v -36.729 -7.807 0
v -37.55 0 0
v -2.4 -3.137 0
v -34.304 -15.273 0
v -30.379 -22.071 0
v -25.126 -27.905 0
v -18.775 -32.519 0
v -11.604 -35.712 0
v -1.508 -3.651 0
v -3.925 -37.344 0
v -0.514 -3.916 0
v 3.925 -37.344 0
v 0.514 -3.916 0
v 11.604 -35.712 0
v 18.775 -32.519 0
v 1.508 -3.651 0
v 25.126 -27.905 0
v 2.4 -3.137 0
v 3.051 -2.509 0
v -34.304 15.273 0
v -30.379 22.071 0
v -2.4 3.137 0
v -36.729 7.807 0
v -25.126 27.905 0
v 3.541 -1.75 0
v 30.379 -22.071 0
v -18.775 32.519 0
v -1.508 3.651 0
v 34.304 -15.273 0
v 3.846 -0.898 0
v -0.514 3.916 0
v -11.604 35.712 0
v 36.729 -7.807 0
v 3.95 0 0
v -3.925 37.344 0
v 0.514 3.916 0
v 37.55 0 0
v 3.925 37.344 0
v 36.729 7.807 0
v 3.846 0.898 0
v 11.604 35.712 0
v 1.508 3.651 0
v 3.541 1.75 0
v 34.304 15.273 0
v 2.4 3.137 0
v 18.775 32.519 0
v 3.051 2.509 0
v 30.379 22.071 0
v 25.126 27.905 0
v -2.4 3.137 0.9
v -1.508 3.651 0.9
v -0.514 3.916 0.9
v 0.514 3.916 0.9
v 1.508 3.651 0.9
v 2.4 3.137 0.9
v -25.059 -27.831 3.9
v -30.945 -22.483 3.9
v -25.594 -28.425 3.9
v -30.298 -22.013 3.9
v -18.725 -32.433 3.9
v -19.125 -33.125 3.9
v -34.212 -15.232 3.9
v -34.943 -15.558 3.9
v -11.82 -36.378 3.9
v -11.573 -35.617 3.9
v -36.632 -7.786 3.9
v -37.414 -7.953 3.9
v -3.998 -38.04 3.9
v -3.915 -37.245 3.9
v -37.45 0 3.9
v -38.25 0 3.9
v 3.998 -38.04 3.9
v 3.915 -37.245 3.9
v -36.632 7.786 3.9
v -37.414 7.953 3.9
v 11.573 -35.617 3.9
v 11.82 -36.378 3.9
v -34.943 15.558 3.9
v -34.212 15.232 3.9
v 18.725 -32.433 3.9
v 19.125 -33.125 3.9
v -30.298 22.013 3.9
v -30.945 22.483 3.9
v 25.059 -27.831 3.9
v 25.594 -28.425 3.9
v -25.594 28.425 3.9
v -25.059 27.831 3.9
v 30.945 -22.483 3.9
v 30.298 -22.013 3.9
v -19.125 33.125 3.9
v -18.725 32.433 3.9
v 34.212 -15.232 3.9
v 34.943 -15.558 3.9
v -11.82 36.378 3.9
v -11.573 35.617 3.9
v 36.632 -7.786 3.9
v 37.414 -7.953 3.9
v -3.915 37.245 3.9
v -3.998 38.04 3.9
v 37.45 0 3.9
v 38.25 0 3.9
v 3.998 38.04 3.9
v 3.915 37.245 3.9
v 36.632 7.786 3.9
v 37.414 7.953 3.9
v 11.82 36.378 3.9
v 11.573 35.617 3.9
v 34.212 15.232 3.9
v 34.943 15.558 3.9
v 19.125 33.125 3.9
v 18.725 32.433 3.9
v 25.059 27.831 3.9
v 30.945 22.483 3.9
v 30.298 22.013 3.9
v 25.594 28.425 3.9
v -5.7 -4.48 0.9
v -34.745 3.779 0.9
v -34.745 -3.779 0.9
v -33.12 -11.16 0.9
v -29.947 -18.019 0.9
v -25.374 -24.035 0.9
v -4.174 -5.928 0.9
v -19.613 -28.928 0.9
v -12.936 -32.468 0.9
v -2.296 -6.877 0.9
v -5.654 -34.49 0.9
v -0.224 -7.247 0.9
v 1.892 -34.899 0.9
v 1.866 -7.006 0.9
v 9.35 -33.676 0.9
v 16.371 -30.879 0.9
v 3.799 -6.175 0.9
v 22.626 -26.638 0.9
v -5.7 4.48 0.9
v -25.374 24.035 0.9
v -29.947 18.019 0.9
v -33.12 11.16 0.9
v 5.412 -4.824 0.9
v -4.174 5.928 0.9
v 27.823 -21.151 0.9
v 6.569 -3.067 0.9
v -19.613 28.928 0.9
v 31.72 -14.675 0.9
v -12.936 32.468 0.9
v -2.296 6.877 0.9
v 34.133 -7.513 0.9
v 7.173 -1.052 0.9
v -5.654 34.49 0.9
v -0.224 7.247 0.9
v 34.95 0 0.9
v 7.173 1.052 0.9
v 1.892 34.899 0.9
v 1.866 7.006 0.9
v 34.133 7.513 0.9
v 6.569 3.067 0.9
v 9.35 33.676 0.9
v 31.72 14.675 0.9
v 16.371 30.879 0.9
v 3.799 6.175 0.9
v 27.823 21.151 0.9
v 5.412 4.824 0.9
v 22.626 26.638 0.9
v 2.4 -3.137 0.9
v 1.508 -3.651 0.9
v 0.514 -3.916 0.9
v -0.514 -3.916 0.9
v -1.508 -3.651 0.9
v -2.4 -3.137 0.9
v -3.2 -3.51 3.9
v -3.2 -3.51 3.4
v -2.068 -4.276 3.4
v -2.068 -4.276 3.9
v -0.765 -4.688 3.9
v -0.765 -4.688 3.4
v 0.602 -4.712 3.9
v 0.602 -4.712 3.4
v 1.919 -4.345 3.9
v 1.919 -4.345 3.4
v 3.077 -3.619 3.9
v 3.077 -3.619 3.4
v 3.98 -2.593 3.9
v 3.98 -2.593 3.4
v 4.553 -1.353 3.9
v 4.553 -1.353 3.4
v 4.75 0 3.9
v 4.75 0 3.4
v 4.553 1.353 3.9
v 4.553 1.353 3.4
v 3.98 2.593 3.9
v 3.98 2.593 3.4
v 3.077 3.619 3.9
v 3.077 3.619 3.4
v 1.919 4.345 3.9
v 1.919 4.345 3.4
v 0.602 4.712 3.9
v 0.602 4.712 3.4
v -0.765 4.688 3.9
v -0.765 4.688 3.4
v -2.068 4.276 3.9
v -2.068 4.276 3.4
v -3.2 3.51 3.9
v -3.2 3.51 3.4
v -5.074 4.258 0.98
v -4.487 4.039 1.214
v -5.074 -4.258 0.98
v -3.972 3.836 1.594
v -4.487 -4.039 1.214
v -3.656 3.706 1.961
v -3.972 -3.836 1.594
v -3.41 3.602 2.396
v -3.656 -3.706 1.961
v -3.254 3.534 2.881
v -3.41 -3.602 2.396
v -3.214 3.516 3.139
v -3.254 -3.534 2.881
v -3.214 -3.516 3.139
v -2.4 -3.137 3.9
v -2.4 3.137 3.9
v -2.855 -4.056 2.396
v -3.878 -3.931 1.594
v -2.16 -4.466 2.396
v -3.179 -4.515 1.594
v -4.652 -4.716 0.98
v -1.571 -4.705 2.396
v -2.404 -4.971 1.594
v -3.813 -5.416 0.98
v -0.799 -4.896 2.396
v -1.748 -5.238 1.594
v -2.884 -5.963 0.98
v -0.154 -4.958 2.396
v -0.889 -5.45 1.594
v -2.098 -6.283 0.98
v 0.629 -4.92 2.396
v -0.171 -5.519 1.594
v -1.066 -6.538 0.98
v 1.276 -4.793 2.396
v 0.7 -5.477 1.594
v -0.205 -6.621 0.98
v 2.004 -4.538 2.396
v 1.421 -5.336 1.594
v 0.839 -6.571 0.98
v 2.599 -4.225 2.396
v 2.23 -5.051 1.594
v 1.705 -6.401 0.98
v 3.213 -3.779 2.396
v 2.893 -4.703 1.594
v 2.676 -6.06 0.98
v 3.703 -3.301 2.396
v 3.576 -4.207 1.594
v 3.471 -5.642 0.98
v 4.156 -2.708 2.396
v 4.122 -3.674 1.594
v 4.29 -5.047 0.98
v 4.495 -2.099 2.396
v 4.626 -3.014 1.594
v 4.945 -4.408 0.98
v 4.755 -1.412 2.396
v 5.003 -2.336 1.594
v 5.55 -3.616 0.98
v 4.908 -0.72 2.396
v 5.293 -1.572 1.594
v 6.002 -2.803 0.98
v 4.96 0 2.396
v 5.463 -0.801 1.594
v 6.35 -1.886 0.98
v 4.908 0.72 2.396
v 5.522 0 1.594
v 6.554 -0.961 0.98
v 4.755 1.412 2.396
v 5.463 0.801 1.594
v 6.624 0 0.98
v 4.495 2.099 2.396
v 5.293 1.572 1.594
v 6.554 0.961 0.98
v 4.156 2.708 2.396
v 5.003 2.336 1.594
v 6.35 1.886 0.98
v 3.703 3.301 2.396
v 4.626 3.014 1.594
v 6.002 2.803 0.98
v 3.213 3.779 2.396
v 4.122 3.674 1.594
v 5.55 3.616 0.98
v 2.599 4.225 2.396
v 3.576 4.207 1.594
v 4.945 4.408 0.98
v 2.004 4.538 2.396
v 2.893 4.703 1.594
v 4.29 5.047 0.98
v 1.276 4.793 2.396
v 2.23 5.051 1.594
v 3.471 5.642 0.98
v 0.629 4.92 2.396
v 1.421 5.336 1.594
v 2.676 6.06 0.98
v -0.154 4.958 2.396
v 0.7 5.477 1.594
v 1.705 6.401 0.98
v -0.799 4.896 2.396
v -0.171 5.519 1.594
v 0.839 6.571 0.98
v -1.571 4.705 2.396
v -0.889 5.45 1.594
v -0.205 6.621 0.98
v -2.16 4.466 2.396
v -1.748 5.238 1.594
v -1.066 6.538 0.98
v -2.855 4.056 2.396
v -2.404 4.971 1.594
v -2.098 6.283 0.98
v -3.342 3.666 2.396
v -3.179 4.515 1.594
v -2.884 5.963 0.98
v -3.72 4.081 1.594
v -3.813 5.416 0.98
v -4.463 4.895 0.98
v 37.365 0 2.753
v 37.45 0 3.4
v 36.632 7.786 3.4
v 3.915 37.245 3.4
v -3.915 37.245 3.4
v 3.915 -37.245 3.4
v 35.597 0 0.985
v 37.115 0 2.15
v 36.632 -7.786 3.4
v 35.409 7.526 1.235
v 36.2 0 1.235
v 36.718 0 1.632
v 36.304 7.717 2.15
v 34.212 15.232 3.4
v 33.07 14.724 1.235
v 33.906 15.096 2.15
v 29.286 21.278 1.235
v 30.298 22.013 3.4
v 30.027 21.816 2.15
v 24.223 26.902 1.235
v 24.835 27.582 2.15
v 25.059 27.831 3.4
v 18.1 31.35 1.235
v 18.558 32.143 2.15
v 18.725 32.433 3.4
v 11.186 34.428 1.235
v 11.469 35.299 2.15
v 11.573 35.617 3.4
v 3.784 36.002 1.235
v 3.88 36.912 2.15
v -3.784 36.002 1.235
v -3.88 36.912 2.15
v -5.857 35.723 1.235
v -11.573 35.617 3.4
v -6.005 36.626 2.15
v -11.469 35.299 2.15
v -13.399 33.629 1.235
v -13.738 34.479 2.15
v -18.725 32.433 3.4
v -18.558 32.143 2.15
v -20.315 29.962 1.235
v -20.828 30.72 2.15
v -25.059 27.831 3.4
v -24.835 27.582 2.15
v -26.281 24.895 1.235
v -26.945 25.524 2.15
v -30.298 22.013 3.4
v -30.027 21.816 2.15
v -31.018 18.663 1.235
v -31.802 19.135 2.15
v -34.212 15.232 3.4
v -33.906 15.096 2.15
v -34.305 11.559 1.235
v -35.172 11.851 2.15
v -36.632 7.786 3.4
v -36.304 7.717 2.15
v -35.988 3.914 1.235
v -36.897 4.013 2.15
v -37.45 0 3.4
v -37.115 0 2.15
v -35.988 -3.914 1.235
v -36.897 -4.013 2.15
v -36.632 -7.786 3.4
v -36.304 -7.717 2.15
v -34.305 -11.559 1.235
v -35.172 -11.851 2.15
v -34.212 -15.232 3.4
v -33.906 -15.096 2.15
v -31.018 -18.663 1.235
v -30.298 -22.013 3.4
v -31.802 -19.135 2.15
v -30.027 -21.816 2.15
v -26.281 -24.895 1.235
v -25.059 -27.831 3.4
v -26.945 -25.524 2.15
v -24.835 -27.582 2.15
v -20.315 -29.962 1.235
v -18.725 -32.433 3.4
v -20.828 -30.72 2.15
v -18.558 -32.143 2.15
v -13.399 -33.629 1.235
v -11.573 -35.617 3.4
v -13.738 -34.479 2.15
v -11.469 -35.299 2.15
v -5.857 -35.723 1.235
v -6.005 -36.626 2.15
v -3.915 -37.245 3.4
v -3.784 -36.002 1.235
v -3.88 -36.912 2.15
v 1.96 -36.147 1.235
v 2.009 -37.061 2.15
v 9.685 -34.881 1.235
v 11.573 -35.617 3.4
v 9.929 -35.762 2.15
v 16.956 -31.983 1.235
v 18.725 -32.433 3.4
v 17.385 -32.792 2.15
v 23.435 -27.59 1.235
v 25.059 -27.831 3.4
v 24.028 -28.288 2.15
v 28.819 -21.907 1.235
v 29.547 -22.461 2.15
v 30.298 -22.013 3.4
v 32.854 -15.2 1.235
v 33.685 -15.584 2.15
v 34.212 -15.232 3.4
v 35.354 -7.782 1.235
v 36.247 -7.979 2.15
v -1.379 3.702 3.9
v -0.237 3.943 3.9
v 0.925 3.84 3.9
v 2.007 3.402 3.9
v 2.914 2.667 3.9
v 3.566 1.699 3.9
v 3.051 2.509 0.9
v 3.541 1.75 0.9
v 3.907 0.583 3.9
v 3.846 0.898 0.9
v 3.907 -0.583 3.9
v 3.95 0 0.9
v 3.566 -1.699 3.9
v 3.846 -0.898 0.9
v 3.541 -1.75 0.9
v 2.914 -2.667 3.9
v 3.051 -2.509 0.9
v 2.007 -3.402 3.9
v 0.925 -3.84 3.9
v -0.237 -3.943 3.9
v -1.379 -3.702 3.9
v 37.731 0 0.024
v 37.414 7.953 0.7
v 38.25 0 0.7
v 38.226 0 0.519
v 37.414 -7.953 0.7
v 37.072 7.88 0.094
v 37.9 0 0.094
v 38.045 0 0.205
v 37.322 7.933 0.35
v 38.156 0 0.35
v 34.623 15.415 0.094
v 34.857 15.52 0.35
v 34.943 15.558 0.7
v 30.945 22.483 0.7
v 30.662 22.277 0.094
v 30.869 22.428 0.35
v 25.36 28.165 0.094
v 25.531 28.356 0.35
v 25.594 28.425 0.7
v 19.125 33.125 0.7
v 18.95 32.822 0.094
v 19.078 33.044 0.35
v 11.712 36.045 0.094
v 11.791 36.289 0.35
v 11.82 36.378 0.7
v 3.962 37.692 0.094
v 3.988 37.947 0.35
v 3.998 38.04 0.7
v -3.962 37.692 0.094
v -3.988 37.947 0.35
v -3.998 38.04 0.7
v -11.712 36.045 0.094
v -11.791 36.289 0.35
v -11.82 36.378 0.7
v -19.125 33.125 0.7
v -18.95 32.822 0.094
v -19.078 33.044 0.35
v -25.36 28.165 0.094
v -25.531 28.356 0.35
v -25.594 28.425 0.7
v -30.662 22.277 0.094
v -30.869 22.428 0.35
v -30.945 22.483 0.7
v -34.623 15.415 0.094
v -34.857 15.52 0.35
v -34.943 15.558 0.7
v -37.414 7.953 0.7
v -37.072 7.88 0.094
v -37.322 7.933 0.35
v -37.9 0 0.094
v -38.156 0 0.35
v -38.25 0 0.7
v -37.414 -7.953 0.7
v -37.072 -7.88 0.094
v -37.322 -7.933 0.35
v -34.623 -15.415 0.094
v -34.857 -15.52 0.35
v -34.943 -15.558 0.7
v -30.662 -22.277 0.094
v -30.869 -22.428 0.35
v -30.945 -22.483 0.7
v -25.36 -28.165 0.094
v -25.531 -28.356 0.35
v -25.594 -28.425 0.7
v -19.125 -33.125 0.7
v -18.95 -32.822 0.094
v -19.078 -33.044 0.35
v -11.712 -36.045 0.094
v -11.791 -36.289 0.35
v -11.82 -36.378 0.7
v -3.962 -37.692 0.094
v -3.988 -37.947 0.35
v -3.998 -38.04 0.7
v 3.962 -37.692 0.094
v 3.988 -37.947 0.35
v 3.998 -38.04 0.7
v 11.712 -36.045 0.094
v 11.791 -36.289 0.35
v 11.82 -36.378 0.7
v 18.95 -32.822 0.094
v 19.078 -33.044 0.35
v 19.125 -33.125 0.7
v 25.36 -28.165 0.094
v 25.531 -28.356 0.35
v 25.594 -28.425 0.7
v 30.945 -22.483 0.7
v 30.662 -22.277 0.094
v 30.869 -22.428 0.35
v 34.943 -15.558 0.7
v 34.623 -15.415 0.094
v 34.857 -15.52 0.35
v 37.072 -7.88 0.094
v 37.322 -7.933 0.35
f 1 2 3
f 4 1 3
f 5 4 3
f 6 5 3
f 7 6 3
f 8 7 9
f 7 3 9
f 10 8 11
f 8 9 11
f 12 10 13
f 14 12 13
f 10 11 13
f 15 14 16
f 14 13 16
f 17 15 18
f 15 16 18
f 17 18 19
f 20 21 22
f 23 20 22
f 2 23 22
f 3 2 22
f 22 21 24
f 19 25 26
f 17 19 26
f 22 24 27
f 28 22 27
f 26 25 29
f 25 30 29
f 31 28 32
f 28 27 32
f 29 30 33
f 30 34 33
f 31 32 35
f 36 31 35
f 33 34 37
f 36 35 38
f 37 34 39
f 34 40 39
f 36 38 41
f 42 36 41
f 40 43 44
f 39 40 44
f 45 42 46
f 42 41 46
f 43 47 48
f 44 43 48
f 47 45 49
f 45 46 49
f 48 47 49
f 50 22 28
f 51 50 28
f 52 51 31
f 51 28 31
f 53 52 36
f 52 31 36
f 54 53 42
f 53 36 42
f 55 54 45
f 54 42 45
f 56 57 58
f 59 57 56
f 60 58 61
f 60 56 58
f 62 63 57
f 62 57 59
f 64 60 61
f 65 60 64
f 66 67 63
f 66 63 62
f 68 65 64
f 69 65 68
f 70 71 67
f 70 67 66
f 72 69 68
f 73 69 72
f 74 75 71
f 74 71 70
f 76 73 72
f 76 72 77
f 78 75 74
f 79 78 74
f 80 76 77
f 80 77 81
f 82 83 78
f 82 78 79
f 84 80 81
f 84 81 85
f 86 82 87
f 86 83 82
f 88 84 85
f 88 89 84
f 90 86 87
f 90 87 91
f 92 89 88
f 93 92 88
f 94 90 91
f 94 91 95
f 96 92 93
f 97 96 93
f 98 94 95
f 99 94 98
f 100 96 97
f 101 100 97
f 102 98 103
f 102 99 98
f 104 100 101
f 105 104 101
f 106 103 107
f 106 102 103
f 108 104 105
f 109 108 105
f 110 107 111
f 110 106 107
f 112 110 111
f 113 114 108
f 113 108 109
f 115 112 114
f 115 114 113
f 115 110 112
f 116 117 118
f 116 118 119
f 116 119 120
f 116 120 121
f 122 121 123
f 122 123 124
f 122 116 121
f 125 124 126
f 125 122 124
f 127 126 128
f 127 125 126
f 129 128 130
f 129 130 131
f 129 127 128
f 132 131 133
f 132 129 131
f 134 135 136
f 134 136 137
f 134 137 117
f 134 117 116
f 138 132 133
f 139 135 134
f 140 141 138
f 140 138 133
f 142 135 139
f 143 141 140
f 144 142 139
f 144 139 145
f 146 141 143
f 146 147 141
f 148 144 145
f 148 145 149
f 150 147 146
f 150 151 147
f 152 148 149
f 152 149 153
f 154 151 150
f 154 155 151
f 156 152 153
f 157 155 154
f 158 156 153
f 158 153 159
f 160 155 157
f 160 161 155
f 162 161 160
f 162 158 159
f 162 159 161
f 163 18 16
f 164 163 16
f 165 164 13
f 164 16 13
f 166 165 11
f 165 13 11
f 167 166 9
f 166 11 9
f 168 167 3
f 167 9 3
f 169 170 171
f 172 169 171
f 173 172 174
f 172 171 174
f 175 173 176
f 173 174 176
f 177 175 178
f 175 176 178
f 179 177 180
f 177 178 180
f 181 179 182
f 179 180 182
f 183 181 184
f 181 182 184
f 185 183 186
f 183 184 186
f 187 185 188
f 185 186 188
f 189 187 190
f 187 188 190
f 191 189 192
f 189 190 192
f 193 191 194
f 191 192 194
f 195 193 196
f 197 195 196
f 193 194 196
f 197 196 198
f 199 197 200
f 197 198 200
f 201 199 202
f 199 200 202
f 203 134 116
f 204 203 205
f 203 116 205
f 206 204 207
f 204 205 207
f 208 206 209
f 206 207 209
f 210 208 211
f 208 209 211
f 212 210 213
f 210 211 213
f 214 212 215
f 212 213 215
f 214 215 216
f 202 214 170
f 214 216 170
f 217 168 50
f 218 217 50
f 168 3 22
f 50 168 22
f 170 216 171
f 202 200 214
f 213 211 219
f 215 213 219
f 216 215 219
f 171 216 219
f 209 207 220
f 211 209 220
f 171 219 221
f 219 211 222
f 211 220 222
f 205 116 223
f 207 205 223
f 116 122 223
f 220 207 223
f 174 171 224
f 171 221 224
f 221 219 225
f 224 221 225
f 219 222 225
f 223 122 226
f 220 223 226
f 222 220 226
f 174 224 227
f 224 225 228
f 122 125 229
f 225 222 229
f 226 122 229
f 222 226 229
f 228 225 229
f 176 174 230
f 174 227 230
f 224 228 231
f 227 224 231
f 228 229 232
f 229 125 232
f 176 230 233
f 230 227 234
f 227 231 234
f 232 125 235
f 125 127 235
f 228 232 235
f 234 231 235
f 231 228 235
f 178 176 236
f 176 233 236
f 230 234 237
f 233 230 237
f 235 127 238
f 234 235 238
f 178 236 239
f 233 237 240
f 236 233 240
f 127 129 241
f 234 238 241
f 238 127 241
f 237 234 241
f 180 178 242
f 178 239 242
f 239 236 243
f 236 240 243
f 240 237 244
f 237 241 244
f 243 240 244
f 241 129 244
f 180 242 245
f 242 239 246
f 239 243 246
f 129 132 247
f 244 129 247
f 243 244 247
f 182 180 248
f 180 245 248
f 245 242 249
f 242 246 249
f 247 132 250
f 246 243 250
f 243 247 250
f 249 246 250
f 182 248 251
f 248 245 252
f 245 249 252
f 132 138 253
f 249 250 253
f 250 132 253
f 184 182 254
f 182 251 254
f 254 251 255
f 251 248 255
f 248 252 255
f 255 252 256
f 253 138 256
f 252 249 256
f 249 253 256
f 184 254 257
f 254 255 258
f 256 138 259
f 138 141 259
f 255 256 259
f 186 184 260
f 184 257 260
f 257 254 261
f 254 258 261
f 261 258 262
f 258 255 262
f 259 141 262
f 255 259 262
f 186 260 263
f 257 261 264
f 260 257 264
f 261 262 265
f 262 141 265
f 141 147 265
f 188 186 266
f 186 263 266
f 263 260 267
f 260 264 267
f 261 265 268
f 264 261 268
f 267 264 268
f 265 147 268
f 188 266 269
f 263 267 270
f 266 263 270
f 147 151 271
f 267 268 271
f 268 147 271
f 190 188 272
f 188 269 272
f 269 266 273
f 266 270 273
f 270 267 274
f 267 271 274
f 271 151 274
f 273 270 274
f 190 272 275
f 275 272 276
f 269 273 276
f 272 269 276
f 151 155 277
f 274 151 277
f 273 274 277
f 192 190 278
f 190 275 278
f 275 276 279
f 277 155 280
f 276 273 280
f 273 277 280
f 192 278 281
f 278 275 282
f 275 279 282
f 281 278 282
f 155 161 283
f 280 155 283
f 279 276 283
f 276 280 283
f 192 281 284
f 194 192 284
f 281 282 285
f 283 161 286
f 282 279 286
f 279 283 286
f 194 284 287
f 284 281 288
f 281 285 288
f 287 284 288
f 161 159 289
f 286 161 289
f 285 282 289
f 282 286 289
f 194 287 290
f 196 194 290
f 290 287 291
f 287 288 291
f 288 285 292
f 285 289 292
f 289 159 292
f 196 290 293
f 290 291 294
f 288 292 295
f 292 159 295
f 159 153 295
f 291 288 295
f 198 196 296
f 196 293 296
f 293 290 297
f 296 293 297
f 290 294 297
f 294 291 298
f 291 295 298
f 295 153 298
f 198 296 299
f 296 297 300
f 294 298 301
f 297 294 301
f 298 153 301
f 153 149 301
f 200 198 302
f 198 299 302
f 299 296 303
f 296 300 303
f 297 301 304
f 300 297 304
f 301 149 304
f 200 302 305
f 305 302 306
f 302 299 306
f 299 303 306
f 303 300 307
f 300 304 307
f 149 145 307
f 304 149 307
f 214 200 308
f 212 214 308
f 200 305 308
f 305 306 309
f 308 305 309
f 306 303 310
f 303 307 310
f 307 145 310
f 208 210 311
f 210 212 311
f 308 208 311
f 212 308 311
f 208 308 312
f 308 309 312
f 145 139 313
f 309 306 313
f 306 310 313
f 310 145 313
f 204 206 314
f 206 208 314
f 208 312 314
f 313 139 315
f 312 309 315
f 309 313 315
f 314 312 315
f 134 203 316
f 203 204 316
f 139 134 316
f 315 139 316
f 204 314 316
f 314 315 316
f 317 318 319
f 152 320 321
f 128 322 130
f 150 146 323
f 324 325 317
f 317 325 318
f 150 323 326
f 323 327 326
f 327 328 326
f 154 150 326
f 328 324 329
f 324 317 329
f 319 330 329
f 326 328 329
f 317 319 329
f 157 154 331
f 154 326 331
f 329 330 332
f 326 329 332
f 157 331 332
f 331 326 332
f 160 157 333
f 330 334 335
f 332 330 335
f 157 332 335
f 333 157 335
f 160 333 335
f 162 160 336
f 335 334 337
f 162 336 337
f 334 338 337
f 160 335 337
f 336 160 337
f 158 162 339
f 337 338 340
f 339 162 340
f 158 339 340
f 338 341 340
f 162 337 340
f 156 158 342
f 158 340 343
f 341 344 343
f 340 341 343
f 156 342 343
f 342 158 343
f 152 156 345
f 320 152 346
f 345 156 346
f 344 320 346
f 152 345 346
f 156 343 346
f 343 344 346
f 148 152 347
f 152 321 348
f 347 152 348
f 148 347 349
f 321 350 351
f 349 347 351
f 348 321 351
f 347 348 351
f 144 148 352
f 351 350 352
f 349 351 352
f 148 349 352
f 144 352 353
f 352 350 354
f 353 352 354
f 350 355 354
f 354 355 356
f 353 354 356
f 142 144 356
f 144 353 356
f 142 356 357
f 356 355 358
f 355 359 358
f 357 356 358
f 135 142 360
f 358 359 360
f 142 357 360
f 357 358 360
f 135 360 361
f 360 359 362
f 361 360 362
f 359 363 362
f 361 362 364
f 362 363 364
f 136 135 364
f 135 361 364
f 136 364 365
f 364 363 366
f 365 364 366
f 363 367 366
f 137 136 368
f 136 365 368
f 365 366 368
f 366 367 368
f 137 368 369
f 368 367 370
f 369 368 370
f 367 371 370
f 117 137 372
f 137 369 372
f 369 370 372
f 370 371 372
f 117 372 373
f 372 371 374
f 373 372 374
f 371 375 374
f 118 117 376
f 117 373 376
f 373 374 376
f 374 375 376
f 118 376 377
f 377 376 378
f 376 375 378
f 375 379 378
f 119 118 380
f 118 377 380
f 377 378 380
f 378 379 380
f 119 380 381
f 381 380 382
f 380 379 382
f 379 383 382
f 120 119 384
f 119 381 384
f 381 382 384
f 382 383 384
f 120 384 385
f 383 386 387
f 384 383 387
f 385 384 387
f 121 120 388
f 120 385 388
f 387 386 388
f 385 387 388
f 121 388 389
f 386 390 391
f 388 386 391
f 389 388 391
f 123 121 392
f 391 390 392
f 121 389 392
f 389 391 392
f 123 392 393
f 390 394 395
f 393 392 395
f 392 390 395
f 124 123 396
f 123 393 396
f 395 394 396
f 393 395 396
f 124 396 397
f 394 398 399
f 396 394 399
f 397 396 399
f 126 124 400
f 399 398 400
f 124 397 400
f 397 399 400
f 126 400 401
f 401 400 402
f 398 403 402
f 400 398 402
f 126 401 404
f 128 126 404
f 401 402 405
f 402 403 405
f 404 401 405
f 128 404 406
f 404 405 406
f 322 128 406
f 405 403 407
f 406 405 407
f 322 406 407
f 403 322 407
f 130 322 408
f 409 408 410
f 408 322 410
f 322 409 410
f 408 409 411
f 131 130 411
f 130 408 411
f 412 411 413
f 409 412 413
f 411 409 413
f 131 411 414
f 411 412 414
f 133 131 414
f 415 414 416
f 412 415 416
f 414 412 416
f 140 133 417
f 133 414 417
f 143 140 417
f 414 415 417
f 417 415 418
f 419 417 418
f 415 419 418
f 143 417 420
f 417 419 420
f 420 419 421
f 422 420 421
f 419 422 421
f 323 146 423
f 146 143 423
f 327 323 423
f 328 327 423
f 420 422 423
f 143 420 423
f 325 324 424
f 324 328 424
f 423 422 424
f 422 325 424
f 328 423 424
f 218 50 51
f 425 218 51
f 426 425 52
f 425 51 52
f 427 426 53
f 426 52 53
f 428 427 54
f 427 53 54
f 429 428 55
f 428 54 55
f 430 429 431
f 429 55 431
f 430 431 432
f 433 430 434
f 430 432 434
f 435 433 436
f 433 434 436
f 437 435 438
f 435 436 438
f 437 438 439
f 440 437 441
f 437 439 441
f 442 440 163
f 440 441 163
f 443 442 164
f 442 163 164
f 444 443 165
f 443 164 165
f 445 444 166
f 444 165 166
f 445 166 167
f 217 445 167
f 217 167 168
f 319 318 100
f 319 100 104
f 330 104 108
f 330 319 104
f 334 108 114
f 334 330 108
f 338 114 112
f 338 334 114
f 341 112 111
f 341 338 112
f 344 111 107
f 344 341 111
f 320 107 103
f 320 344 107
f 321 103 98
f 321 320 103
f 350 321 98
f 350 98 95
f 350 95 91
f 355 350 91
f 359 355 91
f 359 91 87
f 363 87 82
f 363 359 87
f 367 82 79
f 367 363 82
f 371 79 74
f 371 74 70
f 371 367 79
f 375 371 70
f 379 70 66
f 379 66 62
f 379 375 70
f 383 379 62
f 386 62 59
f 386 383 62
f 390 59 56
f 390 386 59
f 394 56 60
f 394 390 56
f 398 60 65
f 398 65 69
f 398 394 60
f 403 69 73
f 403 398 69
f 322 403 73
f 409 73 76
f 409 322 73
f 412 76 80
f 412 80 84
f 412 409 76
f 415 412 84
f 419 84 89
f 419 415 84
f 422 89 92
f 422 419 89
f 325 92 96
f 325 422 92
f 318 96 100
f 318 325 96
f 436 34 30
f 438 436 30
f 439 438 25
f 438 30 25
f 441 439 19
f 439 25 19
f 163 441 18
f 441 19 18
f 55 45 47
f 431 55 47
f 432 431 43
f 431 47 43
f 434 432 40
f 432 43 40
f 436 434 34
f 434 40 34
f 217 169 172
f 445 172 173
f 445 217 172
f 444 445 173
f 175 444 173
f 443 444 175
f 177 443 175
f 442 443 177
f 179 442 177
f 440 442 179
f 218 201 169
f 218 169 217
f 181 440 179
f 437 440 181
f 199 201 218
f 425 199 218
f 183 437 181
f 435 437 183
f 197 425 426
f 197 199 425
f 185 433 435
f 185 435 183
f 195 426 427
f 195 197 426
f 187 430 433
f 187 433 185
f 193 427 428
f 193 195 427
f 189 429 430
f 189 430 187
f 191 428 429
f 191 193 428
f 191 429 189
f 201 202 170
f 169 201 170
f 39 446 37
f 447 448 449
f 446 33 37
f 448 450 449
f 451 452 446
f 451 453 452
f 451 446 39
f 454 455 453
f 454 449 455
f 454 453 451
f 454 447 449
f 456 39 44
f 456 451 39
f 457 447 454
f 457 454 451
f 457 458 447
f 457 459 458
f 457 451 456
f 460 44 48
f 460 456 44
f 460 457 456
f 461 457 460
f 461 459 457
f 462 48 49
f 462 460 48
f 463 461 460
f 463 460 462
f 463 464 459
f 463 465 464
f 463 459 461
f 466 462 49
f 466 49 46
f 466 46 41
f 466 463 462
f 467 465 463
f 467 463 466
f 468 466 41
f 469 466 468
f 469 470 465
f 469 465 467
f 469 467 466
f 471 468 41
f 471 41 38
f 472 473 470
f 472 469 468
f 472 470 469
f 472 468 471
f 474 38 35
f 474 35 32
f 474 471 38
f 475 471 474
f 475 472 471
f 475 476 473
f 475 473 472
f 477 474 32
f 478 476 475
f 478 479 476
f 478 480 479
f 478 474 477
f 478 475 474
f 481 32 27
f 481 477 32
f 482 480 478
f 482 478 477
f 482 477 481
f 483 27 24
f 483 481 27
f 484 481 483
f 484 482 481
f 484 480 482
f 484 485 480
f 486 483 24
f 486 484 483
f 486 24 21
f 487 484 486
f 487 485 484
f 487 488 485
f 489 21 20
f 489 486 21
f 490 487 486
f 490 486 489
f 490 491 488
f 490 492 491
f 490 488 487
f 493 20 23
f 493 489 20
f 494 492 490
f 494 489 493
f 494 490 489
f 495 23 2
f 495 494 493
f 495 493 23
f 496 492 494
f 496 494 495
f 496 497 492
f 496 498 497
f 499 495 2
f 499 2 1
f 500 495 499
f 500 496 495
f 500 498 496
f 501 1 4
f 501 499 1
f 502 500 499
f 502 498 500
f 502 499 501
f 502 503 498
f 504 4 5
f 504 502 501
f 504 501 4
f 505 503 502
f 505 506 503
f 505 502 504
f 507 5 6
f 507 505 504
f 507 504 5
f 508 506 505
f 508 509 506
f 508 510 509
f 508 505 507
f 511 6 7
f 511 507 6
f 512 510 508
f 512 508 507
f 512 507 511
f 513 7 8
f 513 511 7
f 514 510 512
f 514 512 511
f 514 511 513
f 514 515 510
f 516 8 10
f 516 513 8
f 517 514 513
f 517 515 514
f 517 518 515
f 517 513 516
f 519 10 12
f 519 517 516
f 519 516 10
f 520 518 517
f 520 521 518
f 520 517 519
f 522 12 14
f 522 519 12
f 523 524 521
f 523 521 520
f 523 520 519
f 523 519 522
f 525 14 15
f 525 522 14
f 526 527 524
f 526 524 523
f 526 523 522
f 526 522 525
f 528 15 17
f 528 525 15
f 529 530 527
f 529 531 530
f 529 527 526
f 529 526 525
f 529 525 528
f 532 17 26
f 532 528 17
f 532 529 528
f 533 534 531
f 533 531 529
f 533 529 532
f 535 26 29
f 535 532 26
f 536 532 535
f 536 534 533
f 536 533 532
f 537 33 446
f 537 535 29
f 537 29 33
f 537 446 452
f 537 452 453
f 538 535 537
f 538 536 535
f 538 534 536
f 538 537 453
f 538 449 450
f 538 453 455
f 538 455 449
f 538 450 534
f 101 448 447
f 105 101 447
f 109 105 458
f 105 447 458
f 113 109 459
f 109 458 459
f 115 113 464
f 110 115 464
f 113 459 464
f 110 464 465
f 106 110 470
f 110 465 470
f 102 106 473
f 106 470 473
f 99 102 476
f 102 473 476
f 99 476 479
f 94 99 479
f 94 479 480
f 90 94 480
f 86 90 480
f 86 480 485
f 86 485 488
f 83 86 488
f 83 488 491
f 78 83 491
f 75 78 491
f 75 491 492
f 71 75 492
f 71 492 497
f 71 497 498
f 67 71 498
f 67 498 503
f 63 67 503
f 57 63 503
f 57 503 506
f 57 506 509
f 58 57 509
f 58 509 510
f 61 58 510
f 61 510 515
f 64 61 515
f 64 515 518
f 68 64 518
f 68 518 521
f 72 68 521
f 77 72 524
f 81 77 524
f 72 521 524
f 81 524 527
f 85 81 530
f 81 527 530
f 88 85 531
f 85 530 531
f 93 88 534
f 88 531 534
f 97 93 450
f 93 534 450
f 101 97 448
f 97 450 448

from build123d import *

# Parameters (mm, degrees)
F0_R     = 38.25
F1_DEPTH = 0.9
F2_R     = 38.25
F2_R_2   = 37.45
F3_DEPTH = 3
F4_R     = 2.5
F5_R     = 0.7


with BuildPart() as f1:
    # F0 (on Top) → F1 (new body)
    with BuildSketch(Plane.XY):
        Circle(F0_R)
        with BuildLine():
            ThreePointArc((2.4, 3.1372758884), (3.5413627321, 1.7496428207), (3.95, 0))
            ThreePointArc((3.95, 0), (3.5413627321, -1.7496428207), (2.4, -3.1372758884))
            ThreePointArc((2.4, -3.1372758884), (0, -3.95), (-2.4, -3.1372758884))
            ThreePointArc((-2.4, -3.1372758884), (-3.95, 0), (-2.4, 3.1372758884))
            ThreePointArc((-2.4, 3.1372758884), (0, 3.95), (2.4, 3.1372758884))
        make_face(mode=Mode.SUBTRACT)
        with BuildLine():
            Line((-2.4, -3.1372758884), (-2.4, 3.1372758884))
            ThreePointArc((-2.4, 3.1372758884), (-3.95, 0), (-2.4, -3.1372758884))
        make_face()
    extrude(amount=F1_DEPTH)

    # F2 (on face) → F3 (join)
    with BuildSketch(Plane.XY.offset(0.9)):
        Circle(F2_R)
        Circle(F2_R_2, mode=Mode.SUBTRACT)
        with BuildLine():
            Line((-3.2, 3.5103418637), (-3.2, -3.5103418637))
            ThreePointArc((-3.2, -3.5103418637), (4.75, 0), (-3.2, 3.5103418637))
        make_face()
        with BuildLine():
            ThreePointArc((-2.4, 3.1372758884), (3.95, 0), (-2.4, -3.1372758884))
            Line((-2.4, -3.1372758884), (-2.4, 3.1372758884))
        make_face(mode=Mode.SUBTRACT)
    extrude(amount=F3_DEPTH)

    # F4
    f4_edges = [f1.edges().sort_by_distance(p)[0] for p in [
        (-37.45, 0, 0.9),
        (-3.2, 0, 0.9),
        (4.75, 0, 0.9),
    ]]
    fillet(f4_edges, radius=F4_R)

    # F5
    f5_edges = [f1.edges().sort_by_distance(p)[0] for p in [
        (-38.25, 0, 0),
    ]]
    fillet(f5_edges, radius=F5_R)


solid = f1.part
